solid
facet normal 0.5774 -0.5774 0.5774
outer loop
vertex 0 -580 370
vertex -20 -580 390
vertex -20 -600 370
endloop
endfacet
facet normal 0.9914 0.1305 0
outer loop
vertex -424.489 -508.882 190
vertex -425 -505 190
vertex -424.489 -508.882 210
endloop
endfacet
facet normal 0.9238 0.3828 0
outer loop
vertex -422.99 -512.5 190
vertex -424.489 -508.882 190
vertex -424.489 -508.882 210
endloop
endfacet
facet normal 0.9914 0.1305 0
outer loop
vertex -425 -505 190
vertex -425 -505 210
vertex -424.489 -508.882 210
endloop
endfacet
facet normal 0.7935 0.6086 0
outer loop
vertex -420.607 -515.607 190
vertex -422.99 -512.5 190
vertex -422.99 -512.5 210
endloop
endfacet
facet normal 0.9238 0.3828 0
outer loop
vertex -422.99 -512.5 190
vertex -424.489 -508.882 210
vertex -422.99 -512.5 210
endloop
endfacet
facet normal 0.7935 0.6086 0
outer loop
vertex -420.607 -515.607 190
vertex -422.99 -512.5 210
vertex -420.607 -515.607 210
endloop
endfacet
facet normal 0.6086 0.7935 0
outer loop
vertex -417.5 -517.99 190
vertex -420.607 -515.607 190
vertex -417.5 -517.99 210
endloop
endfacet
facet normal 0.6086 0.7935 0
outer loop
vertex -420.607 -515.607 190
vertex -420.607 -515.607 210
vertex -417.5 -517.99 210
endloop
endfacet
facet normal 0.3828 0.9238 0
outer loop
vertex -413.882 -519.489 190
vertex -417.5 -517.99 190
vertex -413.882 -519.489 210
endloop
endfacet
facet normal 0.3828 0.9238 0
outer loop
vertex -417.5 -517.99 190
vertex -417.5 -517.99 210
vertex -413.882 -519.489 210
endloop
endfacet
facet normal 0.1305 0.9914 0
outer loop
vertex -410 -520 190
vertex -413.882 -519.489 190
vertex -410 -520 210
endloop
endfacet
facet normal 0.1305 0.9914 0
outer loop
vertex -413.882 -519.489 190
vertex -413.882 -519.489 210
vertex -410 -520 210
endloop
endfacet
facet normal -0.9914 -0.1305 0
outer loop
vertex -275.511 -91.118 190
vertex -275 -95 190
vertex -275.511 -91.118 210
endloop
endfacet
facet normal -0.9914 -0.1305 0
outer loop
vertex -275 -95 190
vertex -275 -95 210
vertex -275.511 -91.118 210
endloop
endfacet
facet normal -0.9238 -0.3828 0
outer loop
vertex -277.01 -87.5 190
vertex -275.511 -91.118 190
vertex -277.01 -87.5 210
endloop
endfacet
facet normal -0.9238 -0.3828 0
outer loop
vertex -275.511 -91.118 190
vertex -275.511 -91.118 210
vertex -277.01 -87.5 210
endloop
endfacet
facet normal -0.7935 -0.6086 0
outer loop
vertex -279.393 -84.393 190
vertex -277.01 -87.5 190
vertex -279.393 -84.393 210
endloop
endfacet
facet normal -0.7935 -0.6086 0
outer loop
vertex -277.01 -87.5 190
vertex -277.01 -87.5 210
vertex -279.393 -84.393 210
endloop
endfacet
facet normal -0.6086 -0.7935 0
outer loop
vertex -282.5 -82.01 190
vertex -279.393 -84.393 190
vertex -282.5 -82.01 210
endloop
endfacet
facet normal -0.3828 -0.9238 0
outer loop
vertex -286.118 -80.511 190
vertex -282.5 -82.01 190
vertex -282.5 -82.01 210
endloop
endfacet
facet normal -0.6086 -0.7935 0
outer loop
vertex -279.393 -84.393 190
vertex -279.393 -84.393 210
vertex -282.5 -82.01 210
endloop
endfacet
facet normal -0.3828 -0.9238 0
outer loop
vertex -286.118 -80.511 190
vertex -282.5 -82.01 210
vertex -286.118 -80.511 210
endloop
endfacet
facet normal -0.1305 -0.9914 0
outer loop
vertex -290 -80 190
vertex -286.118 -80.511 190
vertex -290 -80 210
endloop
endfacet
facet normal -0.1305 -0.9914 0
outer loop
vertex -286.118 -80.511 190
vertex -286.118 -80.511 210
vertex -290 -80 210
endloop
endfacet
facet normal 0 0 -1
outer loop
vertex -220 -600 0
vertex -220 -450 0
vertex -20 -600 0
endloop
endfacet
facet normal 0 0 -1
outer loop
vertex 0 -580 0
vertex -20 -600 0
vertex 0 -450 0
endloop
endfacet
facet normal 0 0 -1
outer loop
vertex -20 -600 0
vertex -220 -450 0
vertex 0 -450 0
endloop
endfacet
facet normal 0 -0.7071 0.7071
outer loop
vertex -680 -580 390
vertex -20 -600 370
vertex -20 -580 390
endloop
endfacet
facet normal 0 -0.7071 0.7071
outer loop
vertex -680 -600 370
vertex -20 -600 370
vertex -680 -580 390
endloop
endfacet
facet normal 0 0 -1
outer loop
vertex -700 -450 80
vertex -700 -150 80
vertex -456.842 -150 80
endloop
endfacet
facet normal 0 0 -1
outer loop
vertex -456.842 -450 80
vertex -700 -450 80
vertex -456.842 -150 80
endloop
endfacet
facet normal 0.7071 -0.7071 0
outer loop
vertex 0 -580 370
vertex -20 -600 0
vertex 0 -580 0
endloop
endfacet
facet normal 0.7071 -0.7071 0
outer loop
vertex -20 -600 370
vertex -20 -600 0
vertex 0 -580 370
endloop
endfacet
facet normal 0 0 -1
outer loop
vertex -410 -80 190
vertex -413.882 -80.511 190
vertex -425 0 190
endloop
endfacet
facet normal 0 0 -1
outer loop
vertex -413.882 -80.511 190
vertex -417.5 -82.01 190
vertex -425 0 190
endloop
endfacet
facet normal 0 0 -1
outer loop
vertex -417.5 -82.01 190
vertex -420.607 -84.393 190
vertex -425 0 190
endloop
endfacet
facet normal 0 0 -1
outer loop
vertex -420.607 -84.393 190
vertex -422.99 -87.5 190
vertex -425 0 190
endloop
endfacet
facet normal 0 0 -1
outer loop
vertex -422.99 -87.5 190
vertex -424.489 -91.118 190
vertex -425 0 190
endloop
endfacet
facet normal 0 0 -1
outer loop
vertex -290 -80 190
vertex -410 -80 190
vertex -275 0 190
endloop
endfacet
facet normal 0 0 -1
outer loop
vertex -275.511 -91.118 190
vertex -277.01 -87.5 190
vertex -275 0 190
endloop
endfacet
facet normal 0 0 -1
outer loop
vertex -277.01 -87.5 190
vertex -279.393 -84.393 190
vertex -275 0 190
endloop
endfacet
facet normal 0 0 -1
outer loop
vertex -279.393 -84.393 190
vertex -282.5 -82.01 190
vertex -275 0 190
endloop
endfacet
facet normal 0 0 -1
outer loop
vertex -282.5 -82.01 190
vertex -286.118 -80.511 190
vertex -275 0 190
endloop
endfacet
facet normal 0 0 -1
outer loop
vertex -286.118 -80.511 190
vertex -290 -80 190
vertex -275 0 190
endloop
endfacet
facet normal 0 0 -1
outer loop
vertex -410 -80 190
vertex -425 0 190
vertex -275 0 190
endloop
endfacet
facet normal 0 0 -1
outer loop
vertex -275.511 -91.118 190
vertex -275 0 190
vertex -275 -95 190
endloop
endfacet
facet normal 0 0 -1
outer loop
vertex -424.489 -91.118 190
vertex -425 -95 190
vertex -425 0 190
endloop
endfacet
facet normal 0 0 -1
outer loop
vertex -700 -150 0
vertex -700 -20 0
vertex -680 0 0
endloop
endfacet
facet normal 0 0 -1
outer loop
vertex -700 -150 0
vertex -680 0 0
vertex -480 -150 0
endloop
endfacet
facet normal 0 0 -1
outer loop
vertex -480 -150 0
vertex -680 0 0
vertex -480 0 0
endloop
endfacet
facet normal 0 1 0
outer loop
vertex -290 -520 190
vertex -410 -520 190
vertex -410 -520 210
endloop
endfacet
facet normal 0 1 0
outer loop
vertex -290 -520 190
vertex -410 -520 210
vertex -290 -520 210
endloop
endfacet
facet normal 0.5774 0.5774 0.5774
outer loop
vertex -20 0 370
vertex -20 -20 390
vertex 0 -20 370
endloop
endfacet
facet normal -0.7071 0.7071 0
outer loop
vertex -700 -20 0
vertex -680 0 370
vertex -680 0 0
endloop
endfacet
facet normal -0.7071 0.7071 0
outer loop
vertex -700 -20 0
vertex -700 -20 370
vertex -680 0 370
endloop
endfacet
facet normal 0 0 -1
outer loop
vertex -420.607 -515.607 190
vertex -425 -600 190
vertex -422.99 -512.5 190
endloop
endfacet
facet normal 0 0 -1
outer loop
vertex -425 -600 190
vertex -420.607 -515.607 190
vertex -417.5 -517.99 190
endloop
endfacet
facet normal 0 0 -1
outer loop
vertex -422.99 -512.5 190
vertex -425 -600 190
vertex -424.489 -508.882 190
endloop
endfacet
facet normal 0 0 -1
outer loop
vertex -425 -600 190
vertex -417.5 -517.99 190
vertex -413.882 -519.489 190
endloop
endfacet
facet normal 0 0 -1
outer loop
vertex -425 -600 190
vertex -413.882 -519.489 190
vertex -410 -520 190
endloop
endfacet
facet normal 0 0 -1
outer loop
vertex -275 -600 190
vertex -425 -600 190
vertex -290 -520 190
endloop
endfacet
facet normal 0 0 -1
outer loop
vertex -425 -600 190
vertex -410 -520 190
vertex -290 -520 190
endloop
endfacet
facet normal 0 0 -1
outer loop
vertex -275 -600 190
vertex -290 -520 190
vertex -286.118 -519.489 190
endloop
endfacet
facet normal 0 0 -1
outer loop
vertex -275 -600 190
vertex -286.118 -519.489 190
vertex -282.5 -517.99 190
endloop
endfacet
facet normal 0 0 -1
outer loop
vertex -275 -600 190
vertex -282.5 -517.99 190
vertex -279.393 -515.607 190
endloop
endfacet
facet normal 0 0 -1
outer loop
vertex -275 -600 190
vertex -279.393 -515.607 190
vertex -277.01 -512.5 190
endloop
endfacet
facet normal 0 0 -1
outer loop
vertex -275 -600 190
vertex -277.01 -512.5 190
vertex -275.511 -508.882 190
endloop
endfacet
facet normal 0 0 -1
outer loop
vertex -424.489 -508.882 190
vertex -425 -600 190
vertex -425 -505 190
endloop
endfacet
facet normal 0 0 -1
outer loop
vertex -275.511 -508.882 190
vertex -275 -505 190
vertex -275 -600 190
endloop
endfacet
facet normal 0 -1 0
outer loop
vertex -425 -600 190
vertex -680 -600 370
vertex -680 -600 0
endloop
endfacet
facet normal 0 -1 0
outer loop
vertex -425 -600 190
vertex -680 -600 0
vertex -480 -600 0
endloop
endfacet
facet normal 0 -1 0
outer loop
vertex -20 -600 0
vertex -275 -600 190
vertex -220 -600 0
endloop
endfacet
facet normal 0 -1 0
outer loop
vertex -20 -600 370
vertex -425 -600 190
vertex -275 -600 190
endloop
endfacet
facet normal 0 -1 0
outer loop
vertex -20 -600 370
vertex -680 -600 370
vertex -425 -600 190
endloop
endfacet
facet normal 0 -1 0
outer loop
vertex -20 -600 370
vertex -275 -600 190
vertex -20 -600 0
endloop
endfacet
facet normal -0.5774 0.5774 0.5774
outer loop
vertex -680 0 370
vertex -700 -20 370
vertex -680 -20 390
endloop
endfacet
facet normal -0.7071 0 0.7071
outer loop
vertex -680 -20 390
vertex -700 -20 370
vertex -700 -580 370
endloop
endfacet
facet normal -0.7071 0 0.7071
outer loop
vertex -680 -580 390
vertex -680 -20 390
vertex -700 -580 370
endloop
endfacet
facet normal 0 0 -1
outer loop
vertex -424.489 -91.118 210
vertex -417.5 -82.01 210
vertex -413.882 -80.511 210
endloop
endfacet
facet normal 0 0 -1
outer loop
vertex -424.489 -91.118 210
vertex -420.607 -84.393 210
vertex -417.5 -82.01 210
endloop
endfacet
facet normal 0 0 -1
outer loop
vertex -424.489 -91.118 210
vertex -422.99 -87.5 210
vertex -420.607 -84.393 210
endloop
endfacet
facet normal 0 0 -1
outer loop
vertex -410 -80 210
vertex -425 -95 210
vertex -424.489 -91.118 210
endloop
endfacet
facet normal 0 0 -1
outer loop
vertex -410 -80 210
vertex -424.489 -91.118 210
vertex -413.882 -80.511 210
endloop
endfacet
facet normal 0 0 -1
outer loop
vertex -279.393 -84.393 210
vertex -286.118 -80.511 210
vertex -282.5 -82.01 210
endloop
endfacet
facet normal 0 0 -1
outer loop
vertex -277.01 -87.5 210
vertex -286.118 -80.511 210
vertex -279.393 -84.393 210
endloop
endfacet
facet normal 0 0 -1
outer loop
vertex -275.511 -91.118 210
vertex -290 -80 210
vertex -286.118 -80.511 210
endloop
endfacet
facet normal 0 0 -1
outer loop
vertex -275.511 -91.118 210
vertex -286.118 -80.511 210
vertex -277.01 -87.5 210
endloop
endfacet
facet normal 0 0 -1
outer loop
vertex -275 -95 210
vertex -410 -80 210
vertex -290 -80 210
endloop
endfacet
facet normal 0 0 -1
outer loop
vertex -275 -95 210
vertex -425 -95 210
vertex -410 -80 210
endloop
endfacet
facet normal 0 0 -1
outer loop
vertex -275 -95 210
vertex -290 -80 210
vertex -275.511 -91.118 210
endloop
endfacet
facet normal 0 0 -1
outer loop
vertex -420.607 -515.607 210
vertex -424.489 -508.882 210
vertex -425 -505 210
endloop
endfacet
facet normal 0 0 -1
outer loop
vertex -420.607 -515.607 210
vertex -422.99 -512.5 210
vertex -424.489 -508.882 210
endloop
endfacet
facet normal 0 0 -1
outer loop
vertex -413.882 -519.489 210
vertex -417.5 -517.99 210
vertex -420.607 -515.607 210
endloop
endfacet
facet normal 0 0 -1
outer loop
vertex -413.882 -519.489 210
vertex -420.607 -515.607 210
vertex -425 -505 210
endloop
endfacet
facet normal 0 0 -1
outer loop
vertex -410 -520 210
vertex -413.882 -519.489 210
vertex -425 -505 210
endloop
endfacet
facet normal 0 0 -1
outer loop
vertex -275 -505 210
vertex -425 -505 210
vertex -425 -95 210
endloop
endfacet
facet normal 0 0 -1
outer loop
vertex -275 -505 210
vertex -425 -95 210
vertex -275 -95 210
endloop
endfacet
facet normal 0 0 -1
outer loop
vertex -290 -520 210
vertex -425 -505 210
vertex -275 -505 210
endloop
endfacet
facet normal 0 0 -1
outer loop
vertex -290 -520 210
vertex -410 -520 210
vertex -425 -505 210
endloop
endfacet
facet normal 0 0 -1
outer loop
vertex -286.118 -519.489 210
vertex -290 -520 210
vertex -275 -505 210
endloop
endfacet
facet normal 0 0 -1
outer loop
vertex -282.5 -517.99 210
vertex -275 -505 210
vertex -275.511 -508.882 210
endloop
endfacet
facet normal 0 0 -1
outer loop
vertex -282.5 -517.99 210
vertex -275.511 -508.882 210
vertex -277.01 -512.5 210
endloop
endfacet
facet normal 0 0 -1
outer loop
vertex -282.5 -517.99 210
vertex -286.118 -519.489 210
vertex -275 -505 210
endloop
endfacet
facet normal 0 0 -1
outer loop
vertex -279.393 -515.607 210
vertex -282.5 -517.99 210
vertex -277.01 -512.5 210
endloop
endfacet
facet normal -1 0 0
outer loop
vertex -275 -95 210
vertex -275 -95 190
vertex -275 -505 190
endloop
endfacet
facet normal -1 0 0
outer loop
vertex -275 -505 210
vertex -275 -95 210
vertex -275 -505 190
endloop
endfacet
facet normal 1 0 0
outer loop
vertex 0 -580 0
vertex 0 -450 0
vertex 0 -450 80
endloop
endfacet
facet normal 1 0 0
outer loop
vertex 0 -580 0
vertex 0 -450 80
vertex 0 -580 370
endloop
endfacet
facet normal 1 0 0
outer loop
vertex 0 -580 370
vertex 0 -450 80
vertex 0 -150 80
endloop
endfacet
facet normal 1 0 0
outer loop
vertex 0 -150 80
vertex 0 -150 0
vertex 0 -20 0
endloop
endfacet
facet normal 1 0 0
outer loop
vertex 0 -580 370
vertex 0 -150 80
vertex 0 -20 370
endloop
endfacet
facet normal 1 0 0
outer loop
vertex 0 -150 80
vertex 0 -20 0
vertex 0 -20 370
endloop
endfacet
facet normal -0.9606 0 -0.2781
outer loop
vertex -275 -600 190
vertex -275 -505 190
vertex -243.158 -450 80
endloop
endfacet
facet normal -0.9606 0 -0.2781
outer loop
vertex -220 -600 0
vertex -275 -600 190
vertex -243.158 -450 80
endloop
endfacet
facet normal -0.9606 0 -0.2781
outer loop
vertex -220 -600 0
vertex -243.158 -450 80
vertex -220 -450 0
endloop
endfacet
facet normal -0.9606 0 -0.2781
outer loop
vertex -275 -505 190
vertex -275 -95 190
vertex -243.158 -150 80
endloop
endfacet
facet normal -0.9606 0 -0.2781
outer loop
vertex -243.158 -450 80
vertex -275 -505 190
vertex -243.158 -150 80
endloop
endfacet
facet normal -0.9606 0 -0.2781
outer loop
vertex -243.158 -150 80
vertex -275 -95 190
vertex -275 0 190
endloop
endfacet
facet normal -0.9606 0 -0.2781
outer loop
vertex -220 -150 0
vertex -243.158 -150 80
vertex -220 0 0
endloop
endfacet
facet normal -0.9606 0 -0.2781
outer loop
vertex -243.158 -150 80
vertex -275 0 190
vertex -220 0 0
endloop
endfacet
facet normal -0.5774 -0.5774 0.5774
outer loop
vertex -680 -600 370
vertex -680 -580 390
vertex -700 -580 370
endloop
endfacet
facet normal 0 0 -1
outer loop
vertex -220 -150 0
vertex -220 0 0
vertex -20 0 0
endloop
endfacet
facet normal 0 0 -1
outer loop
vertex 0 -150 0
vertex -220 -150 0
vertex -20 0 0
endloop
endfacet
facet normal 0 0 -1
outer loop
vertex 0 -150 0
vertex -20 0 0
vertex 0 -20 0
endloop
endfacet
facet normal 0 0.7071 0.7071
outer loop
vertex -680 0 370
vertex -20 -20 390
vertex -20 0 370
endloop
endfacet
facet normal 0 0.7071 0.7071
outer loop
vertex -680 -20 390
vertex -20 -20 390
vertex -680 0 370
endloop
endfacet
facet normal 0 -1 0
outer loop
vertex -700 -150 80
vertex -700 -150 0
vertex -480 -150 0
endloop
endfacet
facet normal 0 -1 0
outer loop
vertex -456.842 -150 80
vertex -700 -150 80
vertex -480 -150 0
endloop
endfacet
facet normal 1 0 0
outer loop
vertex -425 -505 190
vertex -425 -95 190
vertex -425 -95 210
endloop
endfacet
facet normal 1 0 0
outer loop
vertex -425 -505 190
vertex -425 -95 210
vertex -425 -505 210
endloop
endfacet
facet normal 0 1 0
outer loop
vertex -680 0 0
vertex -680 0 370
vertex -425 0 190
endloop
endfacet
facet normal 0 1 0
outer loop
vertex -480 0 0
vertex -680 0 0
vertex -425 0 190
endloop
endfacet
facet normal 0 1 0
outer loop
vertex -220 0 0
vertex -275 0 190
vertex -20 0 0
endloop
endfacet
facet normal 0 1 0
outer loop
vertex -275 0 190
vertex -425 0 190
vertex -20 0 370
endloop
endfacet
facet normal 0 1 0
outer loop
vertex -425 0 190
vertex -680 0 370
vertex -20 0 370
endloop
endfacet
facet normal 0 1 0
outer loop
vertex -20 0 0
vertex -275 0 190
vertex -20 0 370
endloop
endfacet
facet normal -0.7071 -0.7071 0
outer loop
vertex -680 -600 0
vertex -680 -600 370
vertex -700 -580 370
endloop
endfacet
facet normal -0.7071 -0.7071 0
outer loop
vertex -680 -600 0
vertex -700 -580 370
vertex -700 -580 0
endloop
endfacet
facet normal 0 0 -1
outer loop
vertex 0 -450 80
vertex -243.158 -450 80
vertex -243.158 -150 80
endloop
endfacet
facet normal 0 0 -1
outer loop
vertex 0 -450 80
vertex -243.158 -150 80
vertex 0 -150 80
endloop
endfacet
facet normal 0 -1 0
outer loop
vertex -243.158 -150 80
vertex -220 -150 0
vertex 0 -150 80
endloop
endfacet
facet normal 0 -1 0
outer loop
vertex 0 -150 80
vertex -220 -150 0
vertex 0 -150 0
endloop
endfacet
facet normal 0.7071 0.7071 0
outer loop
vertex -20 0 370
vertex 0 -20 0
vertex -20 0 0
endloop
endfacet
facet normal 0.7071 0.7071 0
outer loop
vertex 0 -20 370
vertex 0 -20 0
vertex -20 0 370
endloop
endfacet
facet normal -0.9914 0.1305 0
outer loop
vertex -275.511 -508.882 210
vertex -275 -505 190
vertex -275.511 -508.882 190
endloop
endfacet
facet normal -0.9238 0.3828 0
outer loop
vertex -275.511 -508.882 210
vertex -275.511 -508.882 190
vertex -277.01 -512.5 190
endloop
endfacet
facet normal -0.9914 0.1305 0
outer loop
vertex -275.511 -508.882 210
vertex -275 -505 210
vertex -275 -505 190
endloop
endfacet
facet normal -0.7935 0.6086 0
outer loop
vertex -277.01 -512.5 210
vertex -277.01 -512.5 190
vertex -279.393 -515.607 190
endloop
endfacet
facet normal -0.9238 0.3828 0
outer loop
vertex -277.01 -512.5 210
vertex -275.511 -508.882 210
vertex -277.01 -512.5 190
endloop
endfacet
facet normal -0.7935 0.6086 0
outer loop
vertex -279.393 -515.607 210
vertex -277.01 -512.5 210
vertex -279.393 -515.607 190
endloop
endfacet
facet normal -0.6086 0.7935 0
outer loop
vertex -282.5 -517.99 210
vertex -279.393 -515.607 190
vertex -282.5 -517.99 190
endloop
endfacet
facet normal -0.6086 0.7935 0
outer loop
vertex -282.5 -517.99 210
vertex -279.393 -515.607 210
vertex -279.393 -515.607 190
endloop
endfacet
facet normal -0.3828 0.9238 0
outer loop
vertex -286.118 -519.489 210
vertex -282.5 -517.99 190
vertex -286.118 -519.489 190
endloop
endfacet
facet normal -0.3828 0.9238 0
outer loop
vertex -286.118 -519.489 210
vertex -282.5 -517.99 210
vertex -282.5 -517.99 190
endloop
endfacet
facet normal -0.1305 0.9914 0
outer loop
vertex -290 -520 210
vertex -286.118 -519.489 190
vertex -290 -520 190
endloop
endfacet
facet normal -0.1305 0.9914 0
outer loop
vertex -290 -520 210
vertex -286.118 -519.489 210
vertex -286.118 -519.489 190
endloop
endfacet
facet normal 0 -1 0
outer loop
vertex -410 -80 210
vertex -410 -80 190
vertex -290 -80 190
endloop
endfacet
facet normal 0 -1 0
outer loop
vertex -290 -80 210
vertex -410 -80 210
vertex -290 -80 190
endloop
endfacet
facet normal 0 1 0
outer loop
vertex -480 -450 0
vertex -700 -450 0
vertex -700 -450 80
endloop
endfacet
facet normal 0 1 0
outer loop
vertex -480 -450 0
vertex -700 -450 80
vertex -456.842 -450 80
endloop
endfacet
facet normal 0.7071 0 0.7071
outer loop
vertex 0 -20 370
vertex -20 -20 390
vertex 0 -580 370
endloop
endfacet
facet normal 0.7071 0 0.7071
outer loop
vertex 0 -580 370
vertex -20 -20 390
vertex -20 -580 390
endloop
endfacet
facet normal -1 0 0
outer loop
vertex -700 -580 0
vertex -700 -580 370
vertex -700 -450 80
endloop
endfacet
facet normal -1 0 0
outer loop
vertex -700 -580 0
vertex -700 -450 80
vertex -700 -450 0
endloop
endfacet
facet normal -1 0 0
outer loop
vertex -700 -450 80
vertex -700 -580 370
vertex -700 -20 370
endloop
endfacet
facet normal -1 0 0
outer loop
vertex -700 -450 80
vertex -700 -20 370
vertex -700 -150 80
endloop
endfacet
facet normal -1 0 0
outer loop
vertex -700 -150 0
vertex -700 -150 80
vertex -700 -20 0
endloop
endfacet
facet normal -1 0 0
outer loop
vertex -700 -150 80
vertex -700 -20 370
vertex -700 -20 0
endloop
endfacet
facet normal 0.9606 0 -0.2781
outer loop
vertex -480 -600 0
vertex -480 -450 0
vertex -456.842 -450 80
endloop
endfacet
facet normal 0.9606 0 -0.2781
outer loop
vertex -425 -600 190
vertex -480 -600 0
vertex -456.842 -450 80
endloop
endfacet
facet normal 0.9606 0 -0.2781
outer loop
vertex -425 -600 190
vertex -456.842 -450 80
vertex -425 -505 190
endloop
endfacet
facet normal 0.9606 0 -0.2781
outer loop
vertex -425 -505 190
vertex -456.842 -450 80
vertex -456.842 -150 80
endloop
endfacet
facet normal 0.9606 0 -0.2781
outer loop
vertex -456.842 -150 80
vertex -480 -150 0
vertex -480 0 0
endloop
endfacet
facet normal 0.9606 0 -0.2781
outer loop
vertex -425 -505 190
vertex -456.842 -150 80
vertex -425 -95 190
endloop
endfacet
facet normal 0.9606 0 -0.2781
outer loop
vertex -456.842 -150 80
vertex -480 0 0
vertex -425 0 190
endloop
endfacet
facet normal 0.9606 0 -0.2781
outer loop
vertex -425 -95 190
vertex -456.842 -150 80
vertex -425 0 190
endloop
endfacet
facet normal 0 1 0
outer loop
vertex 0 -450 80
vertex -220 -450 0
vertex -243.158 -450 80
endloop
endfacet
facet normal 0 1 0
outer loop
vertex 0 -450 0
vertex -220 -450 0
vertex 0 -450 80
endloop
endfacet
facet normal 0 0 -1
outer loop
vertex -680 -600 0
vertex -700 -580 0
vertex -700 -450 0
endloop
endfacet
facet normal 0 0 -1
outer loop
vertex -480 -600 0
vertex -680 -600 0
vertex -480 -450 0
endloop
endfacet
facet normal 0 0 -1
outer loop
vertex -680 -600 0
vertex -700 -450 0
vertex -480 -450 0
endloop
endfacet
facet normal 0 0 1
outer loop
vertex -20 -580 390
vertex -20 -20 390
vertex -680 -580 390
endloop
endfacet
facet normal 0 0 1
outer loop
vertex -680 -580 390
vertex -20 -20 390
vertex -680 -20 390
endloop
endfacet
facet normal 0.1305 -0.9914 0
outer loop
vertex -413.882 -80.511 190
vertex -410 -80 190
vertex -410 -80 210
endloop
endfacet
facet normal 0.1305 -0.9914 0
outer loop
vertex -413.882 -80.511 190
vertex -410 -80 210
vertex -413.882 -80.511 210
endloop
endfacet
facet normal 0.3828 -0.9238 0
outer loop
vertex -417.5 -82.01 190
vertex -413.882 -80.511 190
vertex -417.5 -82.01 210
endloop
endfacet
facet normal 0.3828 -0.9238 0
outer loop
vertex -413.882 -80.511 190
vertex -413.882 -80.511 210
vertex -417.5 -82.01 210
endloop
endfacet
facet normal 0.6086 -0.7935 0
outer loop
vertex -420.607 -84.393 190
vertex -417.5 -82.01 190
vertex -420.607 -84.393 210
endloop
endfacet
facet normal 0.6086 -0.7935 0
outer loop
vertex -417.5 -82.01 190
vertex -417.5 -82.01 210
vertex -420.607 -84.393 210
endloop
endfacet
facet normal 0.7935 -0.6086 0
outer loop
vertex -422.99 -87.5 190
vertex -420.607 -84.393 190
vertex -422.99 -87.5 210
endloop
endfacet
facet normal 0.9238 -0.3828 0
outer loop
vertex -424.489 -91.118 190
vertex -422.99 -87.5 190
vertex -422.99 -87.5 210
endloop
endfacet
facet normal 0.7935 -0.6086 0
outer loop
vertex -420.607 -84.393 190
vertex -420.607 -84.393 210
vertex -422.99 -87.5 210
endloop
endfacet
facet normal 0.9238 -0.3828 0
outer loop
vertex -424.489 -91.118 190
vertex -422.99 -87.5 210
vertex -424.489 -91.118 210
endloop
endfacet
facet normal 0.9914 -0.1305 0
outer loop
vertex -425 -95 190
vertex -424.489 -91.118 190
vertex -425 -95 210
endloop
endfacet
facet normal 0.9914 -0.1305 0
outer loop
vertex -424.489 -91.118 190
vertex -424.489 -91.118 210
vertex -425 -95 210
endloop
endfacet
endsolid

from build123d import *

# Parameters (mm, degrees)
F1_DEPTH = 600
F2_W     = 760
F2_H     = 300
F3_DEPTH = 80
F4_W     = 150
F4_H     = 440
F5_DEPTH = 20
F6_SIZE  = 20
F7_R     = 15


with BuildPart() as f1:
    # F0 (on Front) → F1 (new body)
    with BuildSketch(Plane.XZ):
        Polygon((-220, 0), (0, 0), (0, 390), (-700, 390), (-700, 0), (-480, 0), (-425, 190), (-275, 190), align=None)
    extrude(amount=F1_DEPTH)

    # F2 (on face) → F3 (cut)
    with BuildSketch(Plane(origin=(0, 0, 0), x_dir=(1, 0, 0), z_dir=(0, 0, -1))):
        with Locations((-350, 300)):
            Rectangle(F2_W, F2_H)
    extrude(amount=-F3_DEPTH, mode=Mode.SUBTRACT)

    # F4 (on face) → F5 (cut)
    with BuildSketch(Plane(origin=(0, 0, 190), x_dir=(1, 0, 0), z_dir=(0, 0, -1))):
        with Locations((-350, 300)):
            Rectangle(F4_W, F4_H)
    extrude(amount=-F5_DEPTH, mode=Mode.SUBTRACT)

    # F6
    f6_edges = [f1.edges().sort_by_distance(p)[0] for p in [
        (-700, 0, 195),
        (-700, -300, 390),
        (-350, 0, 390),
        (0, -300, 390),
        (-350, -600, 390),
        (-700, -600, 195),
        (0, -600, 195),
        (0, 0, 195),
    ]]
    chamfer(f6_edges, length=F6_SIZE)

    # F7
    f7_edges = [f1.edges().sort_by_distance(p)[0] for p in [
        (-275, -520, 200),
        (-425, -520, 200),
        (-425, -80, 200),
        (-275, -80, 200),
    ]]
    fillet(f7_edges, radius=F7_R)


solid = f1.part
